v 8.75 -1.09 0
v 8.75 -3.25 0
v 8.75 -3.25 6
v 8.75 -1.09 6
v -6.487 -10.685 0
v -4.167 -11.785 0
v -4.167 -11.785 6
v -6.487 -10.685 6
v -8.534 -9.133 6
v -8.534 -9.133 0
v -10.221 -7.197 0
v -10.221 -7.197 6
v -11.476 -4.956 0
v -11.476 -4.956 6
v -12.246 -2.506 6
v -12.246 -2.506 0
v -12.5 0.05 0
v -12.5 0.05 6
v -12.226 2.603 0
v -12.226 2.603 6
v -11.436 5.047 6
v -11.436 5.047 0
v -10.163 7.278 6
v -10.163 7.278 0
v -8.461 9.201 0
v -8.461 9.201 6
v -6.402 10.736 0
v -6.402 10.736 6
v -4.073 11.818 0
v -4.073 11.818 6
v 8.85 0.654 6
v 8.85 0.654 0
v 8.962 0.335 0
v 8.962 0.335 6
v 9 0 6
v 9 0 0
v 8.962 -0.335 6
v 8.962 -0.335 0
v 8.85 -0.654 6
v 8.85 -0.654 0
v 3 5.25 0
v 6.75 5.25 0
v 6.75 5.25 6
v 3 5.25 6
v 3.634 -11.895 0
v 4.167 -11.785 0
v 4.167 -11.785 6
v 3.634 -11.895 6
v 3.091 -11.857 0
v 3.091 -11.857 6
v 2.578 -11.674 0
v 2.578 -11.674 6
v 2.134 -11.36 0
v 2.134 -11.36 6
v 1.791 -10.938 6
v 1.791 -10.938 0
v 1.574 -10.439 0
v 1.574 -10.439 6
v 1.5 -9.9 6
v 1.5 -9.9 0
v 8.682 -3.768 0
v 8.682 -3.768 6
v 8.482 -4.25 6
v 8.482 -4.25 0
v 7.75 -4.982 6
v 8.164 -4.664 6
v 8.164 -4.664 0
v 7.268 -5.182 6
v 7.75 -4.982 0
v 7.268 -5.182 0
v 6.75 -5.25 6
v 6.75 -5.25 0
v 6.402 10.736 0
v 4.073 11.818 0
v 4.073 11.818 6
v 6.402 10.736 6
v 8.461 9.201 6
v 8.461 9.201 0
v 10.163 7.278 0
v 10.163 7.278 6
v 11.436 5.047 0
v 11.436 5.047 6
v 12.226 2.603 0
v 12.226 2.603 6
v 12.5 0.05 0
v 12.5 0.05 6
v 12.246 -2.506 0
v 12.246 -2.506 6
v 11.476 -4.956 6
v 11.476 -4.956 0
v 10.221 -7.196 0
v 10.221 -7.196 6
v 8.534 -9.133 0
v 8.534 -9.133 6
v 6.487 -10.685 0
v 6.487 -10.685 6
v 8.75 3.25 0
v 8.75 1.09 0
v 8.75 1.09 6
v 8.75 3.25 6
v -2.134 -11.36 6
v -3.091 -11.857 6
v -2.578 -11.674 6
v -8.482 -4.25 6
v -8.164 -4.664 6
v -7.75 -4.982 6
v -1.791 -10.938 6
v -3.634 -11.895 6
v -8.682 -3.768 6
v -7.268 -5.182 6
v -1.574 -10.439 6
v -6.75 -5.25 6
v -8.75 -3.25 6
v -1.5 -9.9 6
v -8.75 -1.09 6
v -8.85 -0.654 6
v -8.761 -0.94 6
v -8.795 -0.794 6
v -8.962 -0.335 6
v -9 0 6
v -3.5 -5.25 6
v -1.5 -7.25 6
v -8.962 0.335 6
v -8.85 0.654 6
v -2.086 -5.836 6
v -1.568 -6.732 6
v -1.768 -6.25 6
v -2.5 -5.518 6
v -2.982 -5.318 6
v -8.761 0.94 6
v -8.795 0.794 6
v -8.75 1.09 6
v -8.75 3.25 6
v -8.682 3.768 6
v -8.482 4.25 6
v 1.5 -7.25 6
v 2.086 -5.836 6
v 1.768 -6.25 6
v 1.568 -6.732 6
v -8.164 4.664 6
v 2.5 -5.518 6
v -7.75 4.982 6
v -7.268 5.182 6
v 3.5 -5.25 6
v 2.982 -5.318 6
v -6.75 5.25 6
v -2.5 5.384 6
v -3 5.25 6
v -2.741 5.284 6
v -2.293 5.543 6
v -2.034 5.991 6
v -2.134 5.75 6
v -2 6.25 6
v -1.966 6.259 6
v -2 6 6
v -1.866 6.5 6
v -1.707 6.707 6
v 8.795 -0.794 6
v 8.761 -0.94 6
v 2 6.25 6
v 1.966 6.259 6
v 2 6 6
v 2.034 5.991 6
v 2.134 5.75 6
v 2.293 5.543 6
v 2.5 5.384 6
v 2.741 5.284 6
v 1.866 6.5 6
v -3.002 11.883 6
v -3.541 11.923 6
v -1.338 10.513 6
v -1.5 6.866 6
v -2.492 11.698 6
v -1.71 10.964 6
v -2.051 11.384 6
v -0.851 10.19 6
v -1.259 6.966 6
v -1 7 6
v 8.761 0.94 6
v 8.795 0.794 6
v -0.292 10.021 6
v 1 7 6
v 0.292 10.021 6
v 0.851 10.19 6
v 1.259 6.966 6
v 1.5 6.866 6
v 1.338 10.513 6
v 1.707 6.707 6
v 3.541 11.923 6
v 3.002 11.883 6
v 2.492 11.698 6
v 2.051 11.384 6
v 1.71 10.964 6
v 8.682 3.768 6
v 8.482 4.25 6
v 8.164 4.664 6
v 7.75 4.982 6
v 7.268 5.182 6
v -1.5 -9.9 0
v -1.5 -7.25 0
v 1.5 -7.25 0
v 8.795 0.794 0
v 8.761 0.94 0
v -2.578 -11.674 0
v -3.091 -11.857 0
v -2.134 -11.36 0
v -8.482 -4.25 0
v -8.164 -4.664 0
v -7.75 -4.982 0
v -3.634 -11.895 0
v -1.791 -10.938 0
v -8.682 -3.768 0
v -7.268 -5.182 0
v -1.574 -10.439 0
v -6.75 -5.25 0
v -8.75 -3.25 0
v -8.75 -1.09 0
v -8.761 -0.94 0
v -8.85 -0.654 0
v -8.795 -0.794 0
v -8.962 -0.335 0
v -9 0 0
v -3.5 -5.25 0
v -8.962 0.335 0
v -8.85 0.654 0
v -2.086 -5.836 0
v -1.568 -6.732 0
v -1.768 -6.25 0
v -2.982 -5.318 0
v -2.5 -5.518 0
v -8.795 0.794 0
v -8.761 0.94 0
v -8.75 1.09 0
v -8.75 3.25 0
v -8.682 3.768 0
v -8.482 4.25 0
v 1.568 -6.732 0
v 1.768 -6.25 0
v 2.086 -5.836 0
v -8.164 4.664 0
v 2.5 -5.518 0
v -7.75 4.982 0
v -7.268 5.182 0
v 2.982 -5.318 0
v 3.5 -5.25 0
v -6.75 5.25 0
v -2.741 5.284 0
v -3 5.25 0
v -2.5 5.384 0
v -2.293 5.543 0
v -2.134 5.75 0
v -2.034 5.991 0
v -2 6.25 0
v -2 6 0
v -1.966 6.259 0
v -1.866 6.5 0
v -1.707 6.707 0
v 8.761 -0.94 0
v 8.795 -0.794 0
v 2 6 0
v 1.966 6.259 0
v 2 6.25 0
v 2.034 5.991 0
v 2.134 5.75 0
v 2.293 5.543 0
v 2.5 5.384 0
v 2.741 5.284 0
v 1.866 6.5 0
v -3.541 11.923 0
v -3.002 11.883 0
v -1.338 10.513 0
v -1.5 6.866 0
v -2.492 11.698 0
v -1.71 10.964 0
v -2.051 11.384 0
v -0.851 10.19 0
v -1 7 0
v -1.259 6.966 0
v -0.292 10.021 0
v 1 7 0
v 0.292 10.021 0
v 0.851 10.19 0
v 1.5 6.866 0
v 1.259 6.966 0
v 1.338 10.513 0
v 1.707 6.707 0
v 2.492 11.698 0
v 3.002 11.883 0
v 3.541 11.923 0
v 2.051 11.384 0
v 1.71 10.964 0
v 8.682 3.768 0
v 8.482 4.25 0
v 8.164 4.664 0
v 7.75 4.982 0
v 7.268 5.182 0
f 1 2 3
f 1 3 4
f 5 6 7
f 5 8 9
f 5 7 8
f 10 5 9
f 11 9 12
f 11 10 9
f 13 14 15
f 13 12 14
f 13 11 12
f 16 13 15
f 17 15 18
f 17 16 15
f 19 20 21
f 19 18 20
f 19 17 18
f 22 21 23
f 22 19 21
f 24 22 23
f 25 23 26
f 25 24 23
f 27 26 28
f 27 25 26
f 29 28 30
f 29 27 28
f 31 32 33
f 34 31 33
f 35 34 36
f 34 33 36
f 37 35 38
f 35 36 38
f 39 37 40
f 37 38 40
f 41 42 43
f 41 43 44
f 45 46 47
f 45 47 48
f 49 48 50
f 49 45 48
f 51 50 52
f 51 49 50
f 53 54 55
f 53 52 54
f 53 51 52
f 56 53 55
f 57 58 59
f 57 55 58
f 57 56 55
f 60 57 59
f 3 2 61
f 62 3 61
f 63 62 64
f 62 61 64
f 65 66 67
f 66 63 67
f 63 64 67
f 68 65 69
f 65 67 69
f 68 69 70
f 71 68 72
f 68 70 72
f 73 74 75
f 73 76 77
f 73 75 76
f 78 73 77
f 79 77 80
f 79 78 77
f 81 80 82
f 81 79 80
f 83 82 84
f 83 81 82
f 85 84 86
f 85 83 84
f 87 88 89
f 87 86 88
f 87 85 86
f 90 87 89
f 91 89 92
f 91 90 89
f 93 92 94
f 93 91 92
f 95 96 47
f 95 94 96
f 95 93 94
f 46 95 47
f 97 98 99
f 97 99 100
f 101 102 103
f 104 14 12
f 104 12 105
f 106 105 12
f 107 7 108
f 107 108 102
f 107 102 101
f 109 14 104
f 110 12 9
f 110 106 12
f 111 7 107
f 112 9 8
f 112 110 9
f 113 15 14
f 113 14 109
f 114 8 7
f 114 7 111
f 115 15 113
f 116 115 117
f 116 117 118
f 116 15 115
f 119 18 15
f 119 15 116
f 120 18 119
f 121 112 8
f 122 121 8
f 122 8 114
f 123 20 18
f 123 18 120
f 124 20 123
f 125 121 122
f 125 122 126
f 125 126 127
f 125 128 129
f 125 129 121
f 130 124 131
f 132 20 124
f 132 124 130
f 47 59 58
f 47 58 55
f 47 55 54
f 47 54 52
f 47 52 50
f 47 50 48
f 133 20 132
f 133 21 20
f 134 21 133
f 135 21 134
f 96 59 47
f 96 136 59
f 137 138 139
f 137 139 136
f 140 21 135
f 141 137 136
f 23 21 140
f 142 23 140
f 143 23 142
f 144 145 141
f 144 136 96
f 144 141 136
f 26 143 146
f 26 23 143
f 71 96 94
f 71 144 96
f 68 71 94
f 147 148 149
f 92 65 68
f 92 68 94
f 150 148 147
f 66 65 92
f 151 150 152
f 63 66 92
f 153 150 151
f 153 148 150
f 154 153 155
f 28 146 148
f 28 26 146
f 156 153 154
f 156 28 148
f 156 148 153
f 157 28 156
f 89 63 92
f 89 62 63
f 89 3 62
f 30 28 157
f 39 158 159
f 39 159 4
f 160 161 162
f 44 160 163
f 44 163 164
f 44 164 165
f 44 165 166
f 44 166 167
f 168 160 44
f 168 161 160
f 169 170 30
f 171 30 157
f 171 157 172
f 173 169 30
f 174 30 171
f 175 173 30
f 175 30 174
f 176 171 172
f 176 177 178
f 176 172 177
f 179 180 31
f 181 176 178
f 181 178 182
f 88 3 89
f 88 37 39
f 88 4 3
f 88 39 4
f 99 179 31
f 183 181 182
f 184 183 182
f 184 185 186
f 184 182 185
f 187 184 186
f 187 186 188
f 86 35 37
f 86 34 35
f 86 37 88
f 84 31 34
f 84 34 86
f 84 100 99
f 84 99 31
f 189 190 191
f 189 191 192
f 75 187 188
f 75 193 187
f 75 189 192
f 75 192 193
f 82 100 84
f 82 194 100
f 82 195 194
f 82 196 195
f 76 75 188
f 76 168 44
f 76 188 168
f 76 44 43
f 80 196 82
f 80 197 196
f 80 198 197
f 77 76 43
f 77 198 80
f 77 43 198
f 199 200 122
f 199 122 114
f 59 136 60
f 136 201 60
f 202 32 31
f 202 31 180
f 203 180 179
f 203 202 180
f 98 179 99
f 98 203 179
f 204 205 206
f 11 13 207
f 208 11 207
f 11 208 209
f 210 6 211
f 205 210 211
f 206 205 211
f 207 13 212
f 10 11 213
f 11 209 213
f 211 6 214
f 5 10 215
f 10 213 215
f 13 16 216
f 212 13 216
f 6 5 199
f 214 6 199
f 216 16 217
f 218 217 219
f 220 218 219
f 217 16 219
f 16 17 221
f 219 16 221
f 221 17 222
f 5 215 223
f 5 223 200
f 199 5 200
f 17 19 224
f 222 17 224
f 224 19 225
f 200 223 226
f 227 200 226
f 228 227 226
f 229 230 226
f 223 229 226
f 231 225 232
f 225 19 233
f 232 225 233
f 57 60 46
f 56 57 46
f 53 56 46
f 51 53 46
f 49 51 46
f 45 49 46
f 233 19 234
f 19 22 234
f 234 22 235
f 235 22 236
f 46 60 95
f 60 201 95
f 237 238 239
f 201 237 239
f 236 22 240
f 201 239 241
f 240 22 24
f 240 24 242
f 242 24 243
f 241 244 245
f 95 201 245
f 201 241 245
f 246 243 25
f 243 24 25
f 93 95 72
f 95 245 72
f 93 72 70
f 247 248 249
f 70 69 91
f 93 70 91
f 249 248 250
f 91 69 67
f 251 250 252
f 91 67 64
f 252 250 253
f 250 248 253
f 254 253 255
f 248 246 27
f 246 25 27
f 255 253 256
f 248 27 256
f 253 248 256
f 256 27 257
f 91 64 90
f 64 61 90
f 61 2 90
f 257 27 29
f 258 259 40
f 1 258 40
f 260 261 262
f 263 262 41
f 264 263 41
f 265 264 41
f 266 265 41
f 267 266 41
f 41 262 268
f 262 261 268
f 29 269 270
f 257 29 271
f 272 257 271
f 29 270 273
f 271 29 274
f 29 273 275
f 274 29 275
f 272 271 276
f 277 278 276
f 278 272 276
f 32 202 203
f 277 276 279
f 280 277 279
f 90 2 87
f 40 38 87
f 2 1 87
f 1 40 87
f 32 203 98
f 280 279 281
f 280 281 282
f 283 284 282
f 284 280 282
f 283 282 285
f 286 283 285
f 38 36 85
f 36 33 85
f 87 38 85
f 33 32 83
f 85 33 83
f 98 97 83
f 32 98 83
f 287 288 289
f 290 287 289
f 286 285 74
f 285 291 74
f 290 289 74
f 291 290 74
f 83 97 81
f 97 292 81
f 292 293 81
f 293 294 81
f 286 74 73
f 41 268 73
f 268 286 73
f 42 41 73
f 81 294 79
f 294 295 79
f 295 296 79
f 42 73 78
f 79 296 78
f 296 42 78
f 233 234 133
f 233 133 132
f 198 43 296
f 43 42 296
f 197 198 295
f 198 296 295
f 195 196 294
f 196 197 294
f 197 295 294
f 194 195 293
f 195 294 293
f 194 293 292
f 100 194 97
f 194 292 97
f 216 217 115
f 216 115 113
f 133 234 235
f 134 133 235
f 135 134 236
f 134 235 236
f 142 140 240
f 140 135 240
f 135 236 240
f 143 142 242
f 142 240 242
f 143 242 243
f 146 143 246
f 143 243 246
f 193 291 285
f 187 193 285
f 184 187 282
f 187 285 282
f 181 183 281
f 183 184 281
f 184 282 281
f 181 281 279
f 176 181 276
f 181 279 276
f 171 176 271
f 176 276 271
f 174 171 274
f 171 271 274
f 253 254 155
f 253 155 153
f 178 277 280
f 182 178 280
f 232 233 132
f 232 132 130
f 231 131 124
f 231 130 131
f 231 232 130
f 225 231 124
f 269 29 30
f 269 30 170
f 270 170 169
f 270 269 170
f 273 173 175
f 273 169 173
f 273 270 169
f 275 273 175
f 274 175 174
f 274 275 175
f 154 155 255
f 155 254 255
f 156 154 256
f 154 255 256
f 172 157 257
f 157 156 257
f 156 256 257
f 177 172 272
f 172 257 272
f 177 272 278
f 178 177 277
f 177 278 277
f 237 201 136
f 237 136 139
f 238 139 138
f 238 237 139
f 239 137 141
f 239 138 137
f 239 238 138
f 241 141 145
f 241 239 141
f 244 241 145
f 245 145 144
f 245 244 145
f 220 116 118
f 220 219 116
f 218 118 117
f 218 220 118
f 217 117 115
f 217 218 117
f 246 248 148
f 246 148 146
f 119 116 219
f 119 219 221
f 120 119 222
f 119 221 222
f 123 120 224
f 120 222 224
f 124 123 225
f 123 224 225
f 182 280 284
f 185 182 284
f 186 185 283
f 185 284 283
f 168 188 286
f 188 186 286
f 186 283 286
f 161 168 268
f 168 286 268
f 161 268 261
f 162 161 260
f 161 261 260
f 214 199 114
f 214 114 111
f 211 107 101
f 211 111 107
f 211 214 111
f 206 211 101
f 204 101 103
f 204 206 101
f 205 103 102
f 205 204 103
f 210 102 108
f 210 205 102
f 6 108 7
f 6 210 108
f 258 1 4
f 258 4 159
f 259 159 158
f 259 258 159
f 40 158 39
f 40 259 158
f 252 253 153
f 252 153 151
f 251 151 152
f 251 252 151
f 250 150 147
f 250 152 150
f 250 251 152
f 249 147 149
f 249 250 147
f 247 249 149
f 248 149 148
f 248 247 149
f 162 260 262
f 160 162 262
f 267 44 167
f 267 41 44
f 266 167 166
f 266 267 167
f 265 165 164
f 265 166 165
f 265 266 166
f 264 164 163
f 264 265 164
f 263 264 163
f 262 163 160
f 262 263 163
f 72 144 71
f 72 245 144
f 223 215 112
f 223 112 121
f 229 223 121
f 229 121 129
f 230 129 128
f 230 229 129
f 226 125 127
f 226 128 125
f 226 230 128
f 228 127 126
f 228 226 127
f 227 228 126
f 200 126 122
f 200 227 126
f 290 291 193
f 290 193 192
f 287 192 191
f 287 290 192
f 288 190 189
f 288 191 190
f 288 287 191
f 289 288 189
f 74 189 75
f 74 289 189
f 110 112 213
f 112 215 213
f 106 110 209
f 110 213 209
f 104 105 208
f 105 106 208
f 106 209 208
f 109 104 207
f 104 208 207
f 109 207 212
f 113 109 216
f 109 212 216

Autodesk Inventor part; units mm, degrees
ref_plane "YZ Plane" through (0, 0, 0) normal (1, 0, 0) x (0, 1, 0)
ref_plane "XZ Plane" through (0, 0, 0) normal (0, 1, 0) x (-1, 0, 0)
ref_plane "XY Plane" through (0, 0, 0) normal (0, 0, 1) x (1, 0, 0)
sketch "Sketch1" plane through (0, 0, 0) normal (0, 0, 1) x (1, 0, 0)
  arc A0 (-1.7105, 10.9635) -> (1.7105, 10.9635) centre (0, 12) ccw
  arc A1 (-1.7105, 10.9635) -> (-4.0726, 11.818) centre (-3.421, 9.9271) ccw
  arc A2 (4.0726, 11.818) -> (1.7105, 10.9635) centre (3.421, 9.9271) ccw
  arc A3 (-6.75, 5.25) -> (-8.75, 3.25) centre (-6.75, 3.25) ccw
  arc A4 (8.75, 3.25) -> (6.75, 5.25) centre (6.75, 3.25) ccw
  arc A5 (-8.75, -3.25) -> (-6.75, -5.25) centre (-6.75, -3.25) ccw
  arc A6 (6.75, -5.25) -> (8.75, -3.25) centre (6.75, -3.25) ccw
  arc A7 (-8.85, 0.6538) -> (-8.85, -0.6538) centre (-7.5, 0) ccw
  arc A8 (8.85, -0.6538) -> (8.85, 0.6538) centre (7.5, 0) ccw
  line L0 (0, 6.25) -> (0, -6.25) construction
  line L1 (8.75, -3.25) -> (8.75, -1.0897)
  line L2 (8.75, 1.0897) -> (8.75, 3.25)
  line L3 (-8.75, 3.25) -> (-8.75, 1.0897)
  line L4 (-8.75, -1.0897) -> (-8.75, -3.25)
  line L5 (-1.5, -7.25) -> (-1.5, -9.8995)
  line L6 (1.5, -7.25) -> (1.5, -9.8995)
  line L7 (-7.5, 0) -> (7.5, 0) construction
  line L8 (-6.75, -5.25) -> (-3.5, -5.25)
  line L9 (3.5, -5.25) -> (6.75, -5.25)
  line L10 (-6.75, 5.25) -> (-6.75, -5.25) construction
  arc A9 (-1.5, -7.25) -> (-3.5, -5.25) centre (-3.5, -7.25) ccw
  arc A10 (3.5, -5.25) -> (1.5, -7.25) centre (3.5, -7.25) ccw
  arc A11 (-4.0726, 11.818) -> (-4.1667, -11.7851) centre (0, 0) ccw
  arc A12 (4.1667, -11.7851) -> (4.0726, 11.818) centre (0, 0) ccw
  arc A13 (-4.1667, -11.7851) -> (-1.5, -9.8995) centre (-3.5, -9.8995) ccw
  arc A14 (1.5, -9.8995) -> (4.1667, -11.7851) centre (3.5, -9.8995) ccw
  line L11 (-1, 7) -> (1, 7)
  line L12 (-2, 6) -> (-2, 6.25)
  line L13 (2, 6) -> (2, 6.25)
  line L14 (6.75, 5.25) -> (3, 5.25)
  line L15 (-3, 5.25) -> (-6.75, 5.25)
  arc A15 (-1, 7) -> (-2, 6) centre (-1, 6) ccw
  arc A16 (2, 6) -> (1, 7) centre (1, 6) ccw
  arc A17 (-3, 5.25) -> (-2, 6.25) centre (-3, 6.25) ccw
  arc A18 (2, 6.25) -> (3, 5.25) centre (3, 6.25) ccw
  arc A19 (-8.85, 0.6538) -> (-8.75, 1.0897) centre (-9.75, 1.0897) ccw
  arc A20 (-8.75, -1.0897) -> (-8.85, -0.6538) centre (-9.75, -1.0897) ccw
  arc A21 (8.75, 1.0897) -> (8.85, 0.6538) centre (9.75, 1.0897) ccw
  arc A22 (8.85, -0.6538) -> (8.75, -1.0897) centre (9.75, -1.0897) ccw
  line L16 (-8.75, 3.25) -> (8.75, 3.25) construction
  point P0 (0, 0)
  point P1 (-8.75, -0.8292)
  point P2 (-8.75, 0.8292)
  point P3 (8.75, 0.8292)
  point P4 (8.75, -0.8292)
  point P5 (-1.5, -12.4097)
  point P6 (1.5, -5.25)
  point P7 (1.5, -12.4097)
  point P8 (-1.5, -5.25)
  point P9 (-6.75, 0)
  point P10 (-2, 7)
  point P11 (2, 7)
  point P12 (0, 7)
  point P13 (0, 3.25)
  point P14 (0, 10)
  dimension "d3" = 4
  dimension "d5" = 2
  dimension "d6" = 2
  dimension "d7" = 3
  dimension "d8" = 3
  dimension "d10" = 15
  dimension "d11" = 3
  dimension "d15" = 2
  dimension "d16" = 2
  dimension "d17" = 2
  dimension "d18" = 7
  dimension "d19" = 4
  dimension "d20" = 10.5
  dimension "d21" = 1
  dimension "d22" = 1
  dimension "d25" = 12
  dimension "d26" = 12.5
  dimension "d27" = 17.5
extrude "Extrusion1" add sketch "Sketch1" along normal blind 6
properties part number "Aft Endcap Middle"
